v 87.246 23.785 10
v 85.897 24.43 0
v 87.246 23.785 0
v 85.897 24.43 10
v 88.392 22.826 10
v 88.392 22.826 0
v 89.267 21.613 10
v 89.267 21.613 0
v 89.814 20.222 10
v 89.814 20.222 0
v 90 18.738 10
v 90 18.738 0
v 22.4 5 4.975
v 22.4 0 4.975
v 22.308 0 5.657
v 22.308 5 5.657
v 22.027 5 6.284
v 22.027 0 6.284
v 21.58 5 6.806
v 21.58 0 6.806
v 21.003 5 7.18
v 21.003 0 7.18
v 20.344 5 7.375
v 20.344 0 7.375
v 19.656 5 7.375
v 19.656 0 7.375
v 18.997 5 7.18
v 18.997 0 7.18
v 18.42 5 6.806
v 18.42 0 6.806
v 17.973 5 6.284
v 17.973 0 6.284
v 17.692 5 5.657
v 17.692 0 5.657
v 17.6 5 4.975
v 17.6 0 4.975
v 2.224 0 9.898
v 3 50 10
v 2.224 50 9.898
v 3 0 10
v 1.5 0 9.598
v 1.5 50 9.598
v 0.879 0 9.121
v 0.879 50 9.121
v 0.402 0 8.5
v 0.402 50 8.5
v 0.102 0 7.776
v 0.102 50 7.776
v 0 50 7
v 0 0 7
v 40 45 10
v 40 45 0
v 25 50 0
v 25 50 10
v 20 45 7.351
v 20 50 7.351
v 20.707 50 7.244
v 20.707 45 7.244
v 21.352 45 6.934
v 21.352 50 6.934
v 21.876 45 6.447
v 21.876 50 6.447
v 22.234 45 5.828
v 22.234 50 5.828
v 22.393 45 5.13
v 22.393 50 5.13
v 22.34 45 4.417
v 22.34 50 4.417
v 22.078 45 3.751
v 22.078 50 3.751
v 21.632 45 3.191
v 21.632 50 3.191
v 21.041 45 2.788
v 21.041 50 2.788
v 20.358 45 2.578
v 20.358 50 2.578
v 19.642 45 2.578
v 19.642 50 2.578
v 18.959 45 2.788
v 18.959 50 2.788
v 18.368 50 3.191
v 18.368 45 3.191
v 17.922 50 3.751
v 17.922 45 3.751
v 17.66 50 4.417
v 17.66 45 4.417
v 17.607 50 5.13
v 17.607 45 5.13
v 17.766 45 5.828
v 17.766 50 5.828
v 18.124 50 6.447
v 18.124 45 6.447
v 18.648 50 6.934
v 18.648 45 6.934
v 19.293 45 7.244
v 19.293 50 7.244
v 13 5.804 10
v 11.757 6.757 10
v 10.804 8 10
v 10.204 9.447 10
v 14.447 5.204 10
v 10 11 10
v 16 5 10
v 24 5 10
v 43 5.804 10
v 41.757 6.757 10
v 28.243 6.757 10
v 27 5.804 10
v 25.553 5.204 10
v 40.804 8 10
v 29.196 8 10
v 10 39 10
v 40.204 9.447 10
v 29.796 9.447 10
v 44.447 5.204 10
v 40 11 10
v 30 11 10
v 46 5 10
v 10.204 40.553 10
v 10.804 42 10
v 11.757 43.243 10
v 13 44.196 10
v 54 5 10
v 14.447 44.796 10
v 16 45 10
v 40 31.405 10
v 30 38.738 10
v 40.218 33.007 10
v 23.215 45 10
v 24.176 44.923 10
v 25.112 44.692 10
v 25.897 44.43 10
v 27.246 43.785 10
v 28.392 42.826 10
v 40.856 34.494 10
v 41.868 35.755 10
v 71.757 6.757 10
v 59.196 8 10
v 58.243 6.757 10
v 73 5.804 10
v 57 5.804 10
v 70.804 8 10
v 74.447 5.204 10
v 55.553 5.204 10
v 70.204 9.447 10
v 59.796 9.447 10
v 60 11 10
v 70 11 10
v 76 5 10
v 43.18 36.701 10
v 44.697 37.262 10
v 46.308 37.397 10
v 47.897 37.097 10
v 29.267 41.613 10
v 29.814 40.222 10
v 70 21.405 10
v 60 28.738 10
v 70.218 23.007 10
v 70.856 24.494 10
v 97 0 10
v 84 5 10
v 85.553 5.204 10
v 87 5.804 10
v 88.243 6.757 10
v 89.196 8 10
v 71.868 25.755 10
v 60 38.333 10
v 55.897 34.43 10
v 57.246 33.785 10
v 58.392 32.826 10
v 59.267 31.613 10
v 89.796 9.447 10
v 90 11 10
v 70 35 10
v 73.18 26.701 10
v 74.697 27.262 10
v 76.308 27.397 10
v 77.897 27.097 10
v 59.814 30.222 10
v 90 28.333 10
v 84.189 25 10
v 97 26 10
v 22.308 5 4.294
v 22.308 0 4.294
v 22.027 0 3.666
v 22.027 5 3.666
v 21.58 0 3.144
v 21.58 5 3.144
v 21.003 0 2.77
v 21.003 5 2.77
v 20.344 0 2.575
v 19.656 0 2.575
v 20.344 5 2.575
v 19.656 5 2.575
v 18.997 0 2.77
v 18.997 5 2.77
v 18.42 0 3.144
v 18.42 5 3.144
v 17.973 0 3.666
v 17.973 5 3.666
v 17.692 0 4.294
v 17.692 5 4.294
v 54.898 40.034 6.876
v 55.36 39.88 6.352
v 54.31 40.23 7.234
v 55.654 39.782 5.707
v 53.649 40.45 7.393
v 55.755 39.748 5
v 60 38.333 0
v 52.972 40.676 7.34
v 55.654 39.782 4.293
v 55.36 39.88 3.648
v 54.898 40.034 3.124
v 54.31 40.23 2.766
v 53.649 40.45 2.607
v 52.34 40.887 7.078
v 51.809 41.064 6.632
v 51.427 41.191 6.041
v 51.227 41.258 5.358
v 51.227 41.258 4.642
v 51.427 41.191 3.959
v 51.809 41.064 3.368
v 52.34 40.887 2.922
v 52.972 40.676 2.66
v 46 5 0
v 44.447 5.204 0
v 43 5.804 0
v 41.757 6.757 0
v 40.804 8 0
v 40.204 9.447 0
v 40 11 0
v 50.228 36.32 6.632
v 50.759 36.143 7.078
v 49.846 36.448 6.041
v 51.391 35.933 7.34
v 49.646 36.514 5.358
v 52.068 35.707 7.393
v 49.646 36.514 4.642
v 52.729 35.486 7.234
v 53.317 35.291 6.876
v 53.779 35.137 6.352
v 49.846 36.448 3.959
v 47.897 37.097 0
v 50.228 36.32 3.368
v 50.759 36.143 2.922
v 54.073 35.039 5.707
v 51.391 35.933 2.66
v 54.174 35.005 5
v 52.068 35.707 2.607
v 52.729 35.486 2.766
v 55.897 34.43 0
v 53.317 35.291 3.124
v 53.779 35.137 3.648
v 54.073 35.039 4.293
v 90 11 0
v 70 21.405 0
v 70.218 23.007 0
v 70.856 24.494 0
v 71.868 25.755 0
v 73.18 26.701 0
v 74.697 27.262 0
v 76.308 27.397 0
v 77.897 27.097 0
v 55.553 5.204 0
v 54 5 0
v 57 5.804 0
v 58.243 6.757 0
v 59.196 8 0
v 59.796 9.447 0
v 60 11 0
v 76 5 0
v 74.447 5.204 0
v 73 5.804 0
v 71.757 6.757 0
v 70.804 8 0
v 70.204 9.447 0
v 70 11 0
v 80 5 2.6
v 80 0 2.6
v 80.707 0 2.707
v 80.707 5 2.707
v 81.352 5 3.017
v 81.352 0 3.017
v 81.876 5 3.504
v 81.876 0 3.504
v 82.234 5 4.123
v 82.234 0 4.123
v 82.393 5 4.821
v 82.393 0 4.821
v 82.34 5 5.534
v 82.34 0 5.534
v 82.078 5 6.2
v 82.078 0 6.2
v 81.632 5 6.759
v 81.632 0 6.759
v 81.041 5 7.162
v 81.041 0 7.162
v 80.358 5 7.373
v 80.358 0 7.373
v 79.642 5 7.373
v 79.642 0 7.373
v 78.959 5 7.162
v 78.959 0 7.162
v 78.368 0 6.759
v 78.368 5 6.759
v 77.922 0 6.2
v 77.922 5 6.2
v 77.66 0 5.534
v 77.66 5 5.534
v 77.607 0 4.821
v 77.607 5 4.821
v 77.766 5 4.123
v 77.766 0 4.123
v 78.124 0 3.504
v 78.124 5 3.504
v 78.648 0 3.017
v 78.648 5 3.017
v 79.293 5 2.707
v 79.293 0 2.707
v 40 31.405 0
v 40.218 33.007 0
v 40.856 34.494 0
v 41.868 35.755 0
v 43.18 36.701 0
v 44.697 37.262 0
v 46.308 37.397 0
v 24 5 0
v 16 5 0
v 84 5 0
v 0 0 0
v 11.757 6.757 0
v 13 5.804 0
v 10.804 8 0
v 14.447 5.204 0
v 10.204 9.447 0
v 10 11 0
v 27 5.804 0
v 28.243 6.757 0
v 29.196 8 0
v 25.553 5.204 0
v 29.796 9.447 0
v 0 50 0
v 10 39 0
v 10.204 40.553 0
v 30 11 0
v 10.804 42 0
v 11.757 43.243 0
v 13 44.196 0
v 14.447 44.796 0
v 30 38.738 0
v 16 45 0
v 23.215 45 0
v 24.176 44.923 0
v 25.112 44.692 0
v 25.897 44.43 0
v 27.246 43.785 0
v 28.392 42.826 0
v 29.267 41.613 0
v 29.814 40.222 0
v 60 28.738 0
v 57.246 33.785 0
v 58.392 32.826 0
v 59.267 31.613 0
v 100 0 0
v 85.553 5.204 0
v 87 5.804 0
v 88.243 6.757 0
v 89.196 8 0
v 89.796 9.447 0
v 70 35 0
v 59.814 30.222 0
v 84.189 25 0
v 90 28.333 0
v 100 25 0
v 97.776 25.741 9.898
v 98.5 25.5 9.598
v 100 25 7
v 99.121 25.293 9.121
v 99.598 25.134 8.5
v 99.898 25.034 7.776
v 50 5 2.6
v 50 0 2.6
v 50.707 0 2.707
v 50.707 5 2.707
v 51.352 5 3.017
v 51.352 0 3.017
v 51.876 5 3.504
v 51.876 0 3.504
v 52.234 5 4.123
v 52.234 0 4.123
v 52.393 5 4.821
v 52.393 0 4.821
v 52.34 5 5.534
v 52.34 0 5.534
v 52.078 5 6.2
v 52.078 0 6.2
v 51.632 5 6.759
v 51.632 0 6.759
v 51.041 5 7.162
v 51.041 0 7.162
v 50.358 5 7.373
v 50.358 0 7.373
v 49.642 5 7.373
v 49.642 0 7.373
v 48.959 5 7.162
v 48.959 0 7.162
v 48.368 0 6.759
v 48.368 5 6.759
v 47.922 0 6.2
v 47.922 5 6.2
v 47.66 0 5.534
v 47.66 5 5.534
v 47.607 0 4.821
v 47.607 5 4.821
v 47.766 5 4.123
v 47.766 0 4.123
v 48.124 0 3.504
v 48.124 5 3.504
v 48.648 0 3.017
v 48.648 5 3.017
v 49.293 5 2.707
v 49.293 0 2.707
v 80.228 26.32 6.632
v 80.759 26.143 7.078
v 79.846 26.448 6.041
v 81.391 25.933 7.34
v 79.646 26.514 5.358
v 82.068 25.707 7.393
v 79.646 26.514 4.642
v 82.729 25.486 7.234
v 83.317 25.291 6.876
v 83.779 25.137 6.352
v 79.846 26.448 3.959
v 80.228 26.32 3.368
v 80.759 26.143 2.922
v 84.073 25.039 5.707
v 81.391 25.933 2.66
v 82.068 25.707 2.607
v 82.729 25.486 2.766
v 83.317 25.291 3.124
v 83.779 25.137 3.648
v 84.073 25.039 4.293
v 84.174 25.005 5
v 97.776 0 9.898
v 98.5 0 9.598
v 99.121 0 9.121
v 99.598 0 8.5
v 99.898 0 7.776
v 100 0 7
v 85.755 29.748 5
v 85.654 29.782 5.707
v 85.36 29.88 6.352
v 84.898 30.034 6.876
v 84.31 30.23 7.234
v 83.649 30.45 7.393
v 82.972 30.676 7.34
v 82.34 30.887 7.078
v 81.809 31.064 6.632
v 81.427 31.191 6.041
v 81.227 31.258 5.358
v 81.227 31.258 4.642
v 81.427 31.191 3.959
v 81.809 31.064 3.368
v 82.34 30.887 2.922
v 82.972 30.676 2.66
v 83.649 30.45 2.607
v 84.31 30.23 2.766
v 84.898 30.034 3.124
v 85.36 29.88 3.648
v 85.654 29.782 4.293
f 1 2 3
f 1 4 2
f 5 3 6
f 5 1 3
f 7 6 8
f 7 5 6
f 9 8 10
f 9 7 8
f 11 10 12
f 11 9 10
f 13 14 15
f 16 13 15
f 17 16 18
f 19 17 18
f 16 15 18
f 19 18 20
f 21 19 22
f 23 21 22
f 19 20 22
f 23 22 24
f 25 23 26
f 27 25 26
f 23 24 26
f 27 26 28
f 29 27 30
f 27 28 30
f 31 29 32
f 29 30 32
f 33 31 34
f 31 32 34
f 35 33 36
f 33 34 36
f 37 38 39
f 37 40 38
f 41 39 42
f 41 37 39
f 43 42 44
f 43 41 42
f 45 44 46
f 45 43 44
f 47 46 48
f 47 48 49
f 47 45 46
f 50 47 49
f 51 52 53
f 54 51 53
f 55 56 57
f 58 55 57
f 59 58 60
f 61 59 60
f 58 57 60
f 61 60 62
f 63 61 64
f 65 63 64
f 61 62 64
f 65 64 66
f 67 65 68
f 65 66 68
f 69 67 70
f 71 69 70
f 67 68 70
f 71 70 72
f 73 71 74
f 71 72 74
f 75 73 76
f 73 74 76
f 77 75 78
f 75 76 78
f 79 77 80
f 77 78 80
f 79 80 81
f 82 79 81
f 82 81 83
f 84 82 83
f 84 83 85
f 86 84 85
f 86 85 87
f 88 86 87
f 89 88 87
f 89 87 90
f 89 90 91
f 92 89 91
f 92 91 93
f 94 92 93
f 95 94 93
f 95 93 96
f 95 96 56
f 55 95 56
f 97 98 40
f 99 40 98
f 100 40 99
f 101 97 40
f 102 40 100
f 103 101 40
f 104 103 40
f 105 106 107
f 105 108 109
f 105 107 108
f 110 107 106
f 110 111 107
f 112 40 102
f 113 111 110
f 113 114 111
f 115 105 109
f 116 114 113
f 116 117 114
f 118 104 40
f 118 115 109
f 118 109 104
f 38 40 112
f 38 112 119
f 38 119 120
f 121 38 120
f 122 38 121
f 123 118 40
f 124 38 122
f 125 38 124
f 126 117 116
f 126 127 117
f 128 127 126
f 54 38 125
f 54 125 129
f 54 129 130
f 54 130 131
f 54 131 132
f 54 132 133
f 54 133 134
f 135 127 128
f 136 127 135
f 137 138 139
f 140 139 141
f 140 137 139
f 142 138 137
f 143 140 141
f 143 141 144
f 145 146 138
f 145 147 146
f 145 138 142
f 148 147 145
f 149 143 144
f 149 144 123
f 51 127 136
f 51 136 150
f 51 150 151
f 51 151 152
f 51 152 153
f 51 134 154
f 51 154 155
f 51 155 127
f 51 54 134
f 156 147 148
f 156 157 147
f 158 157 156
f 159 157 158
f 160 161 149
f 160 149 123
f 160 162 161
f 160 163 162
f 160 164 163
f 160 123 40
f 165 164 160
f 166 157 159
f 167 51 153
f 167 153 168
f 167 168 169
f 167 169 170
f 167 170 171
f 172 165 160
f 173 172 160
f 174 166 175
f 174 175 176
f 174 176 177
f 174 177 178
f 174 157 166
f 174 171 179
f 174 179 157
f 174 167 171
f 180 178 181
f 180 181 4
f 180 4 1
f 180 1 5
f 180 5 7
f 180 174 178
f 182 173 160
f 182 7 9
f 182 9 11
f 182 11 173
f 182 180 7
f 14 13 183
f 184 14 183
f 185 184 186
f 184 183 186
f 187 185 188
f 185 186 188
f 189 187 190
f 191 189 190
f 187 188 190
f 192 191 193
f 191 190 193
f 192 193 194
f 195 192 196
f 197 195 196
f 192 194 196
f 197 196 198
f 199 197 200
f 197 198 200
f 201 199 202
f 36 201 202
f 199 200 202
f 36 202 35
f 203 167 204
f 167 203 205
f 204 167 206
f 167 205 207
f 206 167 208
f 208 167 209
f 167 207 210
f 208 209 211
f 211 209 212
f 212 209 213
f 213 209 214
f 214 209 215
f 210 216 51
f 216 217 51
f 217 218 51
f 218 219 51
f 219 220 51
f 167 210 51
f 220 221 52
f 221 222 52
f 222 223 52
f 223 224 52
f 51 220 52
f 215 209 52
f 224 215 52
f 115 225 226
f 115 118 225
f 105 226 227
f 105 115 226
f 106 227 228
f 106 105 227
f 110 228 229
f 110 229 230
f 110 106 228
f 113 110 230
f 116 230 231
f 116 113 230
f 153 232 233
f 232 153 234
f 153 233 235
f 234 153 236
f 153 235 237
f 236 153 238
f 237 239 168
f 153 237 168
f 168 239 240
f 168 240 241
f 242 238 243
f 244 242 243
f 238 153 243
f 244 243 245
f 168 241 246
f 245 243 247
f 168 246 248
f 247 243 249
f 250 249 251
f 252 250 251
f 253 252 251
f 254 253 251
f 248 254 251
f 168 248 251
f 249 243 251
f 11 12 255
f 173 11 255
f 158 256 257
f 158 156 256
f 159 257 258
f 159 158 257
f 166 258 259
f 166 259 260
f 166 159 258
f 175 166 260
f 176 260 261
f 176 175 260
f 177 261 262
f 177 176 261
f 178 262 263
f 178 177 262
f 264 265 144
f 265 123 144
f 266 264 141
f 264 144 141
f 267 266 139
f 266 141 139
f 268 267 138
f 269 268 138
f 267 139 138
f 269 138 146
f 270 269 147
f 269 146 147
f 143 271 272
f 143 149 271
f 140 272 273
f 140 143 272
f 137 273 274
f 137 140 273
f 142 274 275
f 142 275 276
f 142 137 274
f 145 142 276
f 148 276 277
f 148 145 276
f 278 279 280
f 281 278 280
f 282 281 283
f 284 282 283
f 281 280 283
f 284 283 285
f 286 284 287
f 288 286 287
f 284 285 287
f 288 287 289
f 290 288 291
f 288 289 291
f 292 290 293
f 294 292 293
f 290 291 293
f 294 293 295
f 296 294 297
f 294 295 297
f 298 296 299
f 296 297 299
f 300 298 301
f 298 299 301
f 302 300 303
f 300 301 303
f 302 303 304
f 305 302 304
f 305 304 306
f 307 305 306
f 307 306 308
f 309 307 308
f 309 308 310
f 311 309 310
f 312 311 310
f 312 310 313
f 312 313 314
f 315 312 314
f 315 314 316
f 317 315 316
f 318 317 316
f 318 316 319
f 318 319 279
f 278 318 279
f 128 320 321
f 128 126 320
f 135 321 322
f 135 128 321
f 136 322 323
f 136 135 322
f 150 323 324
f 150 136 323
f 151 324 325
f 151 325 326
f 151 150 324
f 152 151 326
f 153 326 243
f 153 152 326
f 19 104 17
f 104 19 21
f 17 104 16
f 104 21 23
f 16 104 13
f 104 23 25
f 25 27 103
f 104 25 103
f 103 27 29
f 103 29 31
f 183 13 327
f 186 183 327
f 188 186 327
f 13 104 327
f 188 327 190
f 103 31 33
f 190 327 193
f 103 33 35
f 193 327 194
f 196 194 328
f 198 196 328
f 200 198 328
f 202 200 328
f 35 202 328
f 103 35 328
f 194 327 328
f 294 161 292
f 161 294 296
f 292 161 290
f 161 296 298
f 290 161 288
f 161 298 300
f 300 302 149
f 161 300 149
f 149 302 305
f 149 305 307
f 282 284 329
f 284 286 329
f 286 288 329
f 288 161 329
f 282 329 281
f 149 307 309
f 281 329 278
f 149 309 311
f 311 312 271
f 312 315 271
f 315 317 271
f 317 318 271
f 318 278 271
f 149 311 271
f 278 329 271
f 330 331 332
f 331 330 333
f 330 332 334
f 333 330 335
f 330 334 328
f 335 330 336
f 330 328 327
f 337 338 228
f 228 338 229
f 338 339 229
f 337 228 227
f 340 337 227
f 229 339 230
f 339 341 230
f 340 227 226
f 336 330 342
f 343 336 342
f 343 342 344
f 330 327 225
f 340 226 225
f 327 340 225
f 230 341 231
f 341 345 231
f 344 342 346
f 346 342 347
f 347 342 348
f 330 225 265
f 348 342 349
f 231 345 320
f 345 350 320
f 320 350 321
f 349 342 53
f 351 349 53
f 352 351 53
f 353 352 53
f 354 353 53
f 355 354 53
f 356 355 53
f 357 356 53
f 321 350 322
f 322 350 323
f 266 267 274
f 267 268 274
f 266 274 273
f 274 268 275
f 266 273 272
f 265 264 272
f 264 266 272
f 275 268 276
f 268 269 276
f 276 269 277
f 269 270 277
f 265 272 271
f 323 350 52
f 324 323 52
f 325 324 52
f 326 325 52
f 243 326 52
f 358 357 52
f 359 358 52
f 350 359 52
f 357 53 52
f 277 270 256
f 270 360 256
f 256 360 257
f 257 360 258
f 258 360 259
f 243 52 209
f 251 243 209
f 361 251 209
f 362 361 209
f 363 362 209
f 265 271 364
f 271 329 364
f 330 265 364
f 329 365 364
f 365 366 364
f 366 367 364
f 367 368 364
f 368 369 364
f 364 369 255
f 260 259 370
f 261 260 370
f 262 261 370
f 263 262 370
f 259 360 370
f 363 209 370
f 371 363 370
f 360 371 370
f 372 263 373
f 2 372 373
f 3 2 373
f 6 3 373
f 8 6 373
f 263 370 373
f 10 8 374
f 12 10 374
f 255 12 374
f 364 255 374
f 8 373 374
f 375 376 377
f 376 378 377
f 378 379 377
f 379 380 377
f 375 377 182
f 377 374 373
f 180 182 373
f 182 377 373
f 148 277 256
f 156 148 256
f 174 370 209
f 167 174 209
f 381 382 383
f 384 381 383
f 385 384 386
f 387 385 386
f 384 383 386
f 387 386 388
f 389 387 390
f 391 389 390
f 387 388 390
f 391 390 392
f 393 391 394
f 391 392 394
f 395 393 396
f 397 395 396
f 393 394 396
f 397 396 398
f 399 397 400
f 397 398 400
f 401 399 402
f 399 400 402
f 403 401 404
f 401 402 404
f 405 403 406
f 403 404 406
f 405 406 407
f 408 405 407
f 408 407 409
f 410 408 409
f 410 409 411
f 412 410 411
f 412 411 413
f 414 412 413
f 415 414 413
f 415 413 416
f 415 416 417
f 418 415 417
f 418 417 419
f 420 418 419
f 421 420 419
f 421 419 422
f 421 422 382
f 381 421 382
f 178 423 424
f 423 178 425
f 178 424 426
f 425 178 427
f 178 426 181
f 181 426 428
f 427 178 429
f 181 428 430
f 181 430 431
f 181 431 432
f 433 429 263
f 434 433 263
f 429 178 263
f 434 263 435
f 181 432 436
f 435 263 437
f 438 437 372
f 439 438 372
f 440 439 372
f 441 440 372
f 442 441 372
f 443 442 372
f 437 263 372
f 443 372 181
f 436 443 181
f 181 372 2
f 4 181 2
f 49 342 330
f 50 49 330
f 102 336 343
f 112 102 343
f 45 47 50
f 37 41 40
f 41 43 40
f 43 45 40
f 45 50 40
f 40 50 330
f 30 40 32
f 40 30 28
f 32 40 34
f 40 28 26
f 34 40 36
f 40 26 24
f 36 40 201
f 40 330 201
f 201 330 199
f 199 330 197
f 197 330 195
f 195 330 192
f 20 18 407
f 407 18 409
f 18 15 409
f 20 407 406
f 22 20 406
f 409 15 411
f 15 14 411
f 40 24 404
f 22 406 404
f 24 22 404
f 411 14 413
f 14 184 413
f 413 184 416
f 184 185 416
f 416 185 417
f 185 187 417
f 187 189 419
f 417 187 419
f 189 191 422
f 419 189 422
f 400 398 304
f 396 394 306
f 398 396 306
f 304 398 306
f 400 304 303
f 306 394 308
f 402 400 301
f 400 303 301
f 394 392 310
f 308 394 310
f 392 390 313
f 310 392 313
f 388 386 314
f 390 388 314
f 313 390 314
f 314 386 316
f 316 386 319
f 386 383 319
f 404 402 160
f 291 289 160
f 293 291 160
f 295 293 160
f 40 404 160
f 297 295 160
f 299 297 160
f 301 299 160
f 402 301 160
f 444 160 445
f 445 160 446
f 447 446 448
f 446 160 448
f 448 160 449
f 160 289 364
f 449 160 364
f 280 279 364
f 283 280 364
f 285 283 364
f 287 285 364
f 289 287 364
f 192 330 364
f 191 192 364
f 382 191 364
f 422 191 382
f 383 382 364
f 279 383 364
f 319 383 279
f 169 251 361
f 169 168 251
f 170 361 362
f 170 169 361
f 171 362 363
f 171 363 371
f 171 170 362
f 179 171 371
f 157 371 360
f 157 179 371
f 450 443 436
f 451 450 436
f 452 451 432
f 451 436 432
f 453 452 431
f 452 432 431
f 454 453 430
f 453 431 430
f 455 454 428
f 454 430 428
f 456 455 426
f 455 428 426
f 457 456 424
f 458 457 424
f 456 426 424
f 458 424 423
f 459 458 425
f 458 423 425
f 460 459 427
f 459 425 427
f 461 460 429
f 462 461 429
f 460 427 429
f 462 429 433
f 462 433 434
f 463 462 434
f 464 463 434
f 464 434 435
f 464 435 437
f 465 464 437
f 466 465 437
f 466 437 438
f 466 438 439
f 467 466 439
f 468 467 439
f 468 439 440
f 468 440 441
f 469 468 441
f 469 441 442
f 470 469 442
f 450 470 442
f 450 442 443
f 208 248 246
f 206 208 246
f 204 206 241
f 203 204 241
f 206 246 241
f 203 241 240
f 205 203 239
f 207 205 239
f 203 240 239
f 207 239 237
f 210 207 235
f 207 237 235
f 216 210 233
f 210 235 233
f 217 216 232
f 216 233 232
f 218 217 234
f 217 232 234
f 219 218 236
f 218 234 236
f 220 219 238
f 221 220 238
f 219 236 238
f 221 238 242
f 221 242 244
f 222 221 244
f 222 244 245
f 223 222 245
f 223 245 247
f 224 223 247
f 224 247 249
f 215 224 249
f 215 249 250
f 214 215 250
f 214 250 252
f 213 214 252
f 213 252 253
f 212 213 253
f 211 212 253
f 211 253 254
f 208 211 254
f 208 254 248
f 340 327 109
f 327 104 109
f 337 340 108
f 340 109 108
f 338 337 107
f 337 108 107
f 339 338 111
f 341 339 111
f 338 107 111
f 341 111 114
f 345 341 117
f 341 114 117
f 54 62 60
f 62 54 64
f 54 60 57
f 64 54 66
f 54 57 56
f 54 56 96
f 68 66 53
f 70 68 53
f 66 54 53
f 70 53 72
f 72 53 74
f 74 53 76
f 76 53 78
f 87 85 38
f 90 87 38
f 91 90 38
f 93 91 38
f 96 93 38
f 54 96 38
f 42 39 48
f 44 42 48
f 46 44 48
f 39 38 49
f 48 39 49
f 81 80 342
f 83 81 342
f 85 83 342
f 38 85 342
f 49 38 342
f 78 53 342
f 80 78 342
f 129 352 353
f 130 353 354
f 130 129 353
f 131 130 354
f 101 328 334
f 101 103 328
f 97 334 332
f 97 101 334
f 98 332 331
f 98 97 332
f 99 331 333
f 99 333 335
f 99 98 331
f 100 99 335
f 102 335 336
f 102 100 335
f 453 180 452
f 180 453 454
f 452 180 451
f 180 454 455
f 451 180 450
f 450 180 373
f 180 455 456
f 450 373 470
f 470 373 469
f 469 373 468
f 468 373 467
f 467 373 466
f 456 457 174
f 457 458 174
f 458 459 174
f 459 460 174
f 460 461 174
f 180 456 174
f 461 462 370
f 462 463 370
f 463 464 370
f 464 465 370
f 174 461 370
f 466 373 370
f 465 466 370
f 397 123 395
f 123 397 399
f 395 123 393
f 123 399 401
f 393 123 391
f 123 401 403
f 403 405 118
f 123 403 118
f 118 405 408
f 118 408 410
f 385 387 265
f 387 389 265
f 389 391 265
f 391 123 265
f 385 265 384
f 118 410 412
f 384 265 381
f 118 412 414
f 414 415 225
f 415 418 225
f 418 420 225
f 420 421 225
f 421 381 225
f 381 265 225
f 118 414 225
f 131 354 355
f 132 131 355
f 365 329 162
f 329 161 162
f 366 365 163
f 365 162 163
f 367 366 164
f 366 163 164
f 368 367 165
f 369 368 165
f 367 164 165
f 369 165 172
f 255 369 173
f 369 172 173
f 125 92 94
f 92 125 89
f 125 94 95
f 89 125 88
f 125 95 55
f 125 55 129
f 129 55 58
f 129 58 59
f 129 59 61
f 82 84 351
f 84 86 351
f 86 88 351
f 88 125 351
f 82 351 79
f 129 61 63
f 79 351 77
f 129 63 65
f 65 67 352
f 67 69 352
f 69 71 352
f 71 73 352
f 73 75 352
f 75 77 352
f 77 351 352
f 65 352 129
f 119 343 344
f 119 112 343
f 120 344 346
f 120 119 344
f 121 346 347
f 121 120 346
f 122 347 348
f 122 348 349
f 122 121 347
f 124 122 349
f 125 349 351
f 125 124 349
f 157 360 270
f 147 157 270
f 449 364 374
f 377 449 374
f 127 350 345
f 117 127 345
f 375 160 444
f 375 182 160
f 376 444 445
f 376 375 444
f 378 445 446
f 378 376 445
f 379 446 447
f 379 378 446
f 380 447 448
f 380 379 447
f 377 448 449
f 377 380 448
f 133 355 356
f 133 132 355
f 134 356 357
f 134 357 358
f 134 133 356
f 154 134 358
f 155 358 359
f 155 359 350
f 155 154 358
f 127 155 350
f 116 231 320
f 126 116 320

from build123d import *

# Parameters (mm, degrees)
BOSS_EXTRU_1_DEPTH      = 10
CONG_1_R                = 6
ESQUISSE3_R             = 2.4
ENL_V_MAT_EXTRU_1_DEPTH = 10
ESQUISSE4_R             = 2.4
ENL_V_MAT_EXTRU_2_DEPTH = 10
ESQUISSE5_R             = 2.4
ENL_V_MAT_EXTRU_3_DEPTH = 113.249721603
CONG_2_R                = 3


with BuildPart() as part:
    # Esquisse1 → Boss.-Extru.1 (new body)
    with BuildSketch(Plane.XY):
        Polygon((25, 50), (9.188611699, 50), (24.188611699, 45), (25, 45), align=None)
        Polygon((40, 45), (25, 50), (25, 45), (30, 45), (30, 43.062870566), (40, 39.729537233), align=None)
        Polygon((25, 45), (25, 44.729537233), (30, 43.062870566), (30, 45), align=None)
        Polygon((24.188611699, 45), (25, 44.729537233), (25, 45), align=None)
        Polygon((0, 50), (0, 25), (10, 25), (10, 45), (24.188611699, 45), (9.188611699, 50), align=None)
        Polygon((0, 25), (0, 0), (25, 0), (25, 5), (10, 5), (10, 25), align=None)
        Polygon((25, 5), (25, 0), (100, 0), (100, 19.729537233), (90, 23.062870566), (90, 5), (70, 5), (70, 25), (60, 25), (60, 5), (40, 5), (40, 25), (30, 25), (30, 5), align=None)
        Polygon((30, 43.062870566), (30, 25), (40, 25), (40, 39.729537233), align=None)
        Polygon((60, 38.333333333), (40, 45), (40, 39.729537233), (60, 33.062870566), align=None)
        Polygon((70, 29.729537233), (70, 35), (60, 38.333333333), (60, 33.062870566), align=None)
        Polygon((60, 25), (70, 25), (70, 29.729537233), (60, 33.062870566), align=None)
        Polygon((84.188611699, 25), (90, 25), (90, 28.333333333), (70, 35), (70, 29.729537233), align=None)
        Polygon((90, 25), (100, 25), (90, 28.333333333), align=None)
        Polygon((90, 23.062870566), (100, 19.729537233), (100, 25), (90, 25), align=None)
        Polygon((84.188611699, 25), (90, 23.062870566), (90, 25), align=None)
    extrude(amount=BOSS_EXTRU_1_DEPTH)

    # Congé1
    cong_1_edges = [part.edges().sort_by_distance(p)[0] for p in [
        (40, 39.729537233, 5),
        (40, 5, 5),
        (60, 5, 5),
        (60, 33.062870566, 5),
        (30, 43.062870566, 5),
        (24.188611699, 45, 5),
        (10, 45, 5),
        (10, 5, 5),
        (30, 5, 5),
        (70, 29.729537233, 5),
        (70, 5, 5),
        (90, 5, 5),
        (90, 23.062870566, 5),
    ]]
    fillet(cong_1_edges, radius=CONG_1_R)

    # Esquisse3 → Enlèv. mat.-Extru.1 (cut)
    with BuildSketch(Plane(origin=(15.91886117, 47.75658351, 0), x_dir=(0.9486832980505138, -0.31622776601683805, 0), z_dir=(-0.31622776601683805, -0.9486832980505138, 0))):
        with Locations((37.924674652, 5)):
            Circle(ESQUISSE3_R)
        with Locations((69.547451254, 5)):
            Circle(ESQUISSE3_R)
    extrude(amount=-ENL_V_MAT_EXTRU_1_DEPTH, mode=Mode.SUBTRACT)

    # Esquisse4 → Enlèv. mat.-Extru.2 (cut)
    with BuildSketch(Plane.XZ):
        with Locations(Location((20, 5, 0), (0, 0, 270))):
            Circle(ESQUISSE4_R)
        with Locations(Location((50, 5, 0), (0, 0, 270))):
            Circle(ESQUISSE4_R)
        with Locations(Location((80, 5, 0), (0, 0, 270))):
            Circle(ESQUISSE4_R)
    extrude(amount=-ENL_V_MAT_EXTRU_2_DEPTH, mode=Mode.SUBTRACT)

    # Esquisse5 → Enlèv. mat.-Extru.3 (cut, through all)
    with BuildSketch(Plane(origin=(0, 50, 0), x_dir=(1, 0, 0), z_dir=(0, 1, 0))):
        with Locations(Location((20, -4.950719268, 0), (0, 0, 270))):
            Circle(ESQUISSE5_R)
    extrude(amount=-ENL_V_MAT_EXTRU_3_DEPTH, mode=Mode.SUBTRACT)

    # Congé2
    cong_2_edges = [part.edges().sort_by_distance(p)[0] for p in [
        (100, 12.5, 10),
        (0, 25, 10),
    ]]
    fillet(cong_2_edges, radius=CONG_2_R)


solid = part.part
